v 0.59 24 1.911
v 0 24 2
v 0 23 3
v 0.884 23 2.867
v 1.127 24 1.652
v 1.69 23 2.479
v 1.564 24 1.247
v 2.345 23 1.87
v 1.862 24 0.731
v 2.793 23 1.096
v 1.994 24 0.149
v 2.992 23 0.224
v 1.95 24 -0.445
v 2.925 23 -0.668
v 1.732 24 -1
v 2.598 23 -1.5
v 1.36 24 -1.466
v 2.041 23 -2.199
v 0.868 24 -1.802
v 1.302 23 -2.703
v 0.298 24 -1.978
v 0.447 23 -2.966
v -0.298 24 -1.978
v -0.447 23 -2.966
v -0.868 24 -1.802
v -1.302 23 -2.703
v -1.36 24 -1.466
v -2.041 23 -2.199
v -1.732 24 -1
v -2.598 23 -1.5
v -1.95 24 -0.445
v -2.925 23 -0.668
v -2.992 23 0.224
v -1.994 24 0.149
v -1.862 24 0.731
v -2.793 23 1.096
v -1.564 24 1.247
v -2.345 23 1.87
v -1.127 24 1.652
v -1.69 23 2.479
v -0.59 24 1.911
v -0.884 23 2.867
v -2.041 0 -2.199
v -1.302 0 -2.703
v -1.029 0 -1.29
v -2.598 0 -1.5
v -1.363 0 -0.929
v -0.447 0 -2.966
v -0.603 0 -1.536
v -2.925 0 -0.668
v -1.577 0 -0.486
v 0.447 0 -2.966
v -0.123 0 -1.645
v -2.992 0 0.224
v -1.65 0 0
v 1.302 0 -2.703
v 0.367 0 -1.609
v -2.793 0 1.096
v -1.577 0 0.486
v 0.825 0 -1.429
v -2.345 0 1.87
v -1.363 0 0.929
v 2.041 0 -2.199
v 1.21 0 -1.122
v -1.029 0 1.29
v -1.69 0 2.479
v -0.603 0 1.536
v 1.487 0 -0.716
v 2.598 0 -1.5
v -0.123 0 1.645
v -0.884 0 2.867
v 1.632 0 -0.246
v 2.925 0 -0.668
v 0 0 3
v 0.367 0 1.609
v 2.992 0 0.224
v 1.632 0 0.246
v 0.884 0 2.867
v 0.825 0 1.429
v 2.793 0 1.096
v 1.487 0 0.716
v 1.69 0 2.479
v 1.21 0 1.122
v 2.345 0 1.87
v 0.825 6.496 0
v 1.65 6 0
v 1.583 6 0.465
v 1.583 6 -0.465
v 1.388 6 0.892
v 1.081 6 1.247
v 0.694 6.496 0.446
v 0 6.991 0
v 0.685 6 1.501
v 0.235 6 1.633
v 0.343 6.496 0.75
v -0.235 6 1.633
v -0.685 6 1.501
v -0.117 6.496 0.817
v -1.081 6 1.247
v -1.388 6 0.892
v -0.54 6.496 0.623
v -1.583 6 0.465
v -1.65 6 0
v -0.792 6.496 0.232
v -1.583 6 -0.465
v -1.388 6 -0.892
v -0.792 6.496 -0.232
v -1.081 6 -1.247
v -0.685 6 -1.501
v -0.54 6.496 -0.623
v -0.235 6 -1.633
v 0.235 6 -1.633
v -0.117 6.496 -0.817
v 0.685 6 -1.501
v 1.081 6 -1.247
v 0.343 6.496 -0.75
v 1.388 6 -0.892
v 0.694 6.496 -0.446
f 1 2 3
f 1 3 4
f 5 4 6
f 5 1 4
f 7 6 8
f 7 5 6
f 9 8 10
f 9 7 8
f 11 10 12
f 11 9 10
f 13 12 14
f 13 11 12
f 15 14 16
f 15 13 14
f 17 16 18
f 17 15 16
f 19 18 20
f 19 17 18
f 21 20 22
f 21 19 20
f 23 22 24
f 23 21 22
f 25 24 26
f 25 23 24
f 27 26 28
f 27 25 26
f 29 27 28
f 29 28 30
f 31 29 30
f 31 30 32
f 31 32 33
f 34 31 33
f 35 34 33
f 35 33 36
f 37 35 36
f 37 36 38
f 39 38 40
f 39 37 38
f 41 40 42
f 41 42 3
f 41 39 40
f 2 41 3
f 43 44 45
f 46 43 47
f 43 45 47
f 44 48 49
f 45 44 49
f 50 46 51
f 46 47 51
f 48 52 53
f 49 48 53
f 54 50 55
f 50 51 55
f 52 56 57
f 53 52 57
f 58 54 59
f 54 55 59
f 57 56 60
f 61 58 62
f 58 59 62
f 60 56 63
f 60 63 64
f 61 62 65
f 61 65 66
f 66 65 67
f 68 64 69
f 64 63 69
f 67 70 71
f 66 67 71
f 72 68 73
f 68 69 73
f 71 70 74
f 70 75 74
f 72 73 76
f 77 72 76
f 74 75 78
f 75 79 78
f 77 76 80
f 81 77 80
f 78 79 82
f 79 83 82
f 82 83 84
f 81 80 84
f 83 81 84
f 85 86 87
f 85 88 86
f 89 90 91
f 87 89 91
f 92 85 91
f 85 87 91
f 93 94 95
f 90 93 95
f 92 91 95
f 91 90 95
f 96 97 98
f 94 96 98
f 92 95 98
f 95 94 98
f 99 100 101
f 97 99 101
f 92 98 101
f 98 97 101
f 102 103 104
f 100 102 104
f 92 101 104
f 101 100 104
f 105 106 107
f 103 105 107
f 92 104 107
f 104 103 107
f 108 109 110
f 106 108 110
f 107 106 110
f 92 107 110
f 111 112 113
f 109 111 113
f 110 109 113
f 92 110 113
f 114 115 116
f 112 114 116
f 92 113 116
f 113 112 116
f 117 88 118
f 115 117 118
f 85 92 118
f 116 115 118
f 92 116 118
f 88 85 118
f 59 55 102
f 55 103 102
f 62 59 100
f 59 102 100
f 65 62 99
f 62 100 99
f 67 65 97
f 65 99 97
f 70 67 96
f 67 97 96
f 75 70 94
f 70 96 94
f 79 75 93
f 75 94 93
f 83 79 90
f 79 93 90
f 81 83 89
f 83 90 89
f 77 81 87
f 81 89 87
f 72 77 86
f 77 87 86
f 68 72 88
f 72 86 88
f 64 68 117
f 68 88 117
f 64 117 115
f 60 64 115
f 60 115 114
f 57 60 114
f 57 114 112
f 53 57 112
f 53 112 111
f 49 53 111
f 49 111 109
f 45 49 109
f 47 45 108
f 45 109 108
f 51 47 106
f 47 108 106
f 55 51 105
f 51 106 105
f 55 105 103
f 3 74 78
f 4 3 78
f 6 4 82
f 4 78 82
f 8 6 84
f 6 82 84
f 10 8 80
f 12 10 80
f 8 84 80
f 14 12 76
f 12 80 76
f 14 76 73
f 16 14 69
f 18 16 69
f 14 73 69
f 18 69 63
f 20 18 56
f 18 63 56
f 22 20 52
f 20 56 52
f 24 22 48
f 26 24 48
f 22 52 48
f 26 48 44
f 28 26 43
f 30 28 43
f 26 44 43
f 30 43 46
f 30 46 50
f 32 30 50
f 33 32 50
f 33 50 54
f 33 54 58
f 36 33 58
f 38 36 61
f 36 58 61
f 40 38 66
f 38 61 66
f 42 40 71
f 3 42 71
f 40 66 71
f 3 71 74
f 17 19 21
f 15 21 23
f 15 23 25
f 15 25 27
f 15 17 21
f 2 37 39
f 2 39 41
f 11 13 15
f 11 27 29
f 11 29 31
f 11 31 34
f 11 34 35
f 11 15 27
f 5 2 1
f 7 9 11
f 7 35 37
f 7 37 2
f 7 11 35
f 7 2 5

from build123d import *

# Parameters (mm, degrees)
SKETCH1_R                 = 3
BOSS_EXTRUDE1_DEPTH       = 24
CHAMFER1_SIZE             = 1
M4X0_7_TAPPED_HOLE1_D     = 3.3
M4X0_7_TAPPED_HOLE1_DEPTH = 6
M4X0_7_TAPPED_HOLE1_TIP   = 0.991420021


with BuildPart() as part:
    # Sketch1 → Boss-Extrude1 (new body)
    with BuildSketch(Plane(origin=(0, 0, 0), x_dir=(1, 0, 0), z_dir=(0, 1, 0))):
        with Locations(Location((0, 0, 0), (0, 0, 270))):
            Circle(SKETCH1_R)
    extrude(amount=BOSS_EXTRUDE1_DEPTH)

    # Chamfer1
    chamfer1_edges = [part.edges().sort_by_distance(p)[0] for p in [
        (0, 24, -3),
    ]]
    chamfer(chamfer1_edges, length=CHAMFER1_SIZE)

    # M4x0.7 Tapped Hole1
    with Locations(Plane.XZ):
        with Locations((0, 0)):
            Hole(M4X0_7_TAPPED_HOLE1_D / 2, depth=M4X0_7_TAPPED_HOLE1_DEPTH)
            with Locations((0, 0, -(M4X0_7_TAPPED_HOLE1_DEPTH + M4X0_7_TAPPED_HOLE1_TIP / 2))):  # 118° drill point
                Cone(0, M4X0_7_TAPPED_HOLE1_D / 2, M4X0_7_TAPPED_HOLE1_TIP, mode=Mode.SUBTRACT)


solid = part.part
